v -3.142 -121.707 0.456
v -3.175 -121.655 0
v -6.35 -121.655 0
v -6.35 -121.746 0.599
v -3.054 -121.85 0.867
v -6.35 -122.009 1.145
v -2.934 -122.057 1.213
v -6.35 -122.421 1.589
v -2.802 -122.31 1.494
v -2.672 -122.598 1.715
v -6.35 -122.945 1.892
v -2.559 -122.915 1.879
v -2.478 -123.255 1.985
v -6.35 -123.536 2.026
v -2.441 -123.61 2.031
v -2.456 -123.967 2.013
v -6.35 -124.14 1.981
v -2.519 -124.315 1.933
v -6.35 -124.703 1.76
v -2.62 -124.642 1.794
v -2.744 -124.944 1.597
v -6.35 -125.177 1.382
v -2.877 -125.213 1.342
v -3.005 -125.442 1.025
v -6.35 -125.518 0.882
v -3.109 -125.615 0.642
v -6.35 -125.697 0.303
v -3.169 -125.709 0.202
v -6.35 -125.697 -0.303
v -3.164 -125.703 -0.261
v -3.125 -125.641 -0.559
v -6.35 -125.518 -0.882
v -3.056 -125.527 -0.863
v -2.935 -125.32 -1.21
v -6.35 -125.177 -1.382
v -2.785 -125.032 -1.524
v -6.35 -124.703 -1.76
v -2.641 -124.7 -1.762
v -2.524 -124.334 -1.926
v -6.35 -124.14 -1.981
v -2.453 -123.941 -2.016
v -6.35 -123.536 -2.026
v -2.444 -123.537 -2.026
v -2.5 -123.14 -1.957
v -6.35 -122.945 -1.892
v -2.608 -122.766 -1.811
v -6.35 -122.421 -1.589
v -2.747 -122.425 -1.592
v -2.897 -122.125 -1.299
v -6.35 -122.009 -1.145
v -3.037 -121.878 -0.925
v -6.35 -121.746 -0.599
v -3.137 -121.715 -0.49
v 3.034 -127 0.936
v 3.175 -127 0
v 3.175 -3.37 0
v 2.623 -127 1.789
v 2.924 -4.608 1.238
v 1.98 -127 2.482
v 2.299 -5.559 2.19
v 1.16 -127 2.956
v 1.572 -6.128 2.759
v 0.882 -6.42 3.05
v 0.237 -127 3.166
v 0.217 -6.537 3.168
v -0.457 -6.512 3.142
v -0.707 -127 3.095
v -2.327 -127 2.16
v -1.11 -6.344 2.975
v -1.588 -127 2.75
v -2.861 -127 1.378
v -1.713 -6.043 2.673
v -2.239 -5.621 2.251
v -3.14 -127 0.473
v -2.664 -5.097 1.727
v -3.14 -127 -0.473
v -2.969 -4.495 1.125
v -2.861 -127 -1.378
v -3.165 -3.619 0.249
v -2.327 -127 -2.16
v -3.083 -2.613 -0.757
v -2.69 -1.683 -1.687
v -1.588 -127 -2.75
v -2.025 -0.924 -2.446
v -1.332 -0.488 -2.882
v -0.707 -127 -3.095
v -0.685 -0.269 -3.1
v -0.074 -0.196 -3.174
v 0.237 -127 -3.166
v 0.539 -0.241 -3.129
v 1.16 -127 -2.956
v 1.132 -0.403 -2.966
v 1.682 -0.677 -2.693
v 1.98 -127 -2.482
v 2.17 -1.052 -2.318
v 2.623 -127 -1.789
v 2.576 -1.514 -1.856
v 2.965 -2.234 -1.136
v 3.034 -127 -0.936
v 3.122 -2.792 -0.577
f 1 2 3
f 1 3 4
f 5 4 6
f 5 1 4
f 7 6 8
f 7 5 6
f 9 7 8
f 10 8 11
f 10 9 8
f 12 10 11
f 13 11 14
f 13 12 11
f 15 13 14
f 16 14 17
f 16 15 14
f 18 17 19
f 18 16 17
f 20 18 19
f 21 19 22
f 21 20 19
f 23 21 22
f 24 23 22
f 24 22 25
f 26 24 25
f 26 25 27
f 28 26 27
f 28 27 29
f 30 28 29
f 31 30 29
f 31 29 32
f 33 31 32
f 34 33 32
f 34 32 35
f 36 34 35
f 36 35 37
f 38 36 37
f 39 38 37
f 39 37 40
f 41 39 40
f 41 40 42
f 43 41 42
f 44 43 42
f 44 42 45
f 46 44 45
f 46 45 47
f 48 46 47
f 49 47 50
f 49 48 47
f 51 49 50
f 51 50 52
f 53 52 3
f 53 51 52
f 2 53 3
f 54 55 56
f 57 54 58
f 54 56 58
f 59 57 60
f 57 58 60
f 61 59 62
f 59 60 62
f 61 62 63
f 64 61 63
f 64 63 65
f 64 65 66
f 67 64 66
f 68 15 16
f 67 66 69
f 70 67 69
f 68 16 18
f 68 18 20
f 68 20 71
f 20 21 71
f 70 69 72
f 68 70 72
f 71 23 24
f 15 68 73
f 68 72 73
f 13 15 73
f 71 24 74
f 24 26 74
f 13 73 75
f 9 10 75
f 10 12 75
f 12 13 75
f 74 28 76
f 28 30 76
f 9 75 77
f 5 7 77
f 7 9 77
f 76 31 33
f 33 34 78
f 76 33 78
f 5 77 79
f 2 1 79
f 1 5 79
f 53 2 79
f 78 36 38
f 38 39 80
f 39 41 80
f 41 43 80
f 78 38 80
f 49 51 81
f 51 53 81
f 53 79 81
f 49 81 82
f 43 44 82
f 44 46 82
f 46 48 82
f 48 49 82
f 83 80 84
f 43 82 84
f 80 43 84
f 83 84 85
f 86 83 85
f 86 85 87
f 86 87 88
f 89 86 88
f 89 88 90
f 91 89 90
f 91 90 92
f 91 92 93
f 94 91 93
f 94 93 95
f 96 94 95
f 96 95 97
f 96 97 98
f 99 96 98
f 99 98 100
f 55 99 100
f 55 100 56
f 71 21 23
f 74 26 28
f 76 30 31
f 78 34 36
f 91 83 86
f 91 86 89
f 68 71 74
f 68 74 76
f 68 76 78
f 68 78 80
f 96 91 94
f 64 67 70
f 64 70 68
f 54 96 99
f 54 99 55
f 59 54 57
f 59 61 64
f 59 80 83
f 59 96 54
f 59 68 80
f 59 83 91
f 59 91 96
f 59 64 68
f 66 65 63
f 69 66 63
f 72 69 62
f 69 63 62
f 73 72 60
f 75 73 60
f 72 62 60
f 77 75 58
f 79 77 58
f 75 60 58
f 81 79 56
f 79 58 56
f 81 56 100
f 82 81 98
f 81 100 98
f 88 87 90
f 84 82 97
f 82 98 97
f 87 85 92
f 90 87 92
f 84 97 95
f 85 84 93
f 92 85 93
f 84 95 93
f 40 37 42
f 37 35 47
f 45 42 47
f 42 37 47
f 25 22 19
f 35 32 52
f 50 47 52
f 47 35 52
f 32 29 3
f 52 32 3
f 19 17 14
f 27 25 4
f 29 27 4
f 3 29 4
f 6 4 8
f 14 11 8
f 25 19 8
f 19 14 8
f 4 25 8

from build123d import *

# Parameters (mm, degrees)
F0_R     = 3.175
F1_DEPTH = 127
F2_R     = 2.032
F3_DEPTH = 6.35
F5_DEPTH = 12.7


with BuildPart() as f1:
    # F0 (on Front) → F1 (new body)
    with BuildSketch(Plane.XZ):
        Circle(F0_R)
    extrude(amount=F1_DEPTH)

    # F2 (on Right) → F3 (join)
    with BuildSketch(Plane.YZ):
        with Locations((-123.687468, 0)):
            Circle(F2_R)
    extrude(amount=-F3_DEPTH)

    # F4 (on Right) → F5 (cut, symmetric)
    with BuildSketch(Plane.YZ):
        Polygon((0.1524, -3.522164), (0.1524, 3.558817), (-6.928581, 3.558817), align=None)
    extrude(amount=F5_DEPTH, both=True, mode=Mode.SUBTRACT)


solid = f1.part
